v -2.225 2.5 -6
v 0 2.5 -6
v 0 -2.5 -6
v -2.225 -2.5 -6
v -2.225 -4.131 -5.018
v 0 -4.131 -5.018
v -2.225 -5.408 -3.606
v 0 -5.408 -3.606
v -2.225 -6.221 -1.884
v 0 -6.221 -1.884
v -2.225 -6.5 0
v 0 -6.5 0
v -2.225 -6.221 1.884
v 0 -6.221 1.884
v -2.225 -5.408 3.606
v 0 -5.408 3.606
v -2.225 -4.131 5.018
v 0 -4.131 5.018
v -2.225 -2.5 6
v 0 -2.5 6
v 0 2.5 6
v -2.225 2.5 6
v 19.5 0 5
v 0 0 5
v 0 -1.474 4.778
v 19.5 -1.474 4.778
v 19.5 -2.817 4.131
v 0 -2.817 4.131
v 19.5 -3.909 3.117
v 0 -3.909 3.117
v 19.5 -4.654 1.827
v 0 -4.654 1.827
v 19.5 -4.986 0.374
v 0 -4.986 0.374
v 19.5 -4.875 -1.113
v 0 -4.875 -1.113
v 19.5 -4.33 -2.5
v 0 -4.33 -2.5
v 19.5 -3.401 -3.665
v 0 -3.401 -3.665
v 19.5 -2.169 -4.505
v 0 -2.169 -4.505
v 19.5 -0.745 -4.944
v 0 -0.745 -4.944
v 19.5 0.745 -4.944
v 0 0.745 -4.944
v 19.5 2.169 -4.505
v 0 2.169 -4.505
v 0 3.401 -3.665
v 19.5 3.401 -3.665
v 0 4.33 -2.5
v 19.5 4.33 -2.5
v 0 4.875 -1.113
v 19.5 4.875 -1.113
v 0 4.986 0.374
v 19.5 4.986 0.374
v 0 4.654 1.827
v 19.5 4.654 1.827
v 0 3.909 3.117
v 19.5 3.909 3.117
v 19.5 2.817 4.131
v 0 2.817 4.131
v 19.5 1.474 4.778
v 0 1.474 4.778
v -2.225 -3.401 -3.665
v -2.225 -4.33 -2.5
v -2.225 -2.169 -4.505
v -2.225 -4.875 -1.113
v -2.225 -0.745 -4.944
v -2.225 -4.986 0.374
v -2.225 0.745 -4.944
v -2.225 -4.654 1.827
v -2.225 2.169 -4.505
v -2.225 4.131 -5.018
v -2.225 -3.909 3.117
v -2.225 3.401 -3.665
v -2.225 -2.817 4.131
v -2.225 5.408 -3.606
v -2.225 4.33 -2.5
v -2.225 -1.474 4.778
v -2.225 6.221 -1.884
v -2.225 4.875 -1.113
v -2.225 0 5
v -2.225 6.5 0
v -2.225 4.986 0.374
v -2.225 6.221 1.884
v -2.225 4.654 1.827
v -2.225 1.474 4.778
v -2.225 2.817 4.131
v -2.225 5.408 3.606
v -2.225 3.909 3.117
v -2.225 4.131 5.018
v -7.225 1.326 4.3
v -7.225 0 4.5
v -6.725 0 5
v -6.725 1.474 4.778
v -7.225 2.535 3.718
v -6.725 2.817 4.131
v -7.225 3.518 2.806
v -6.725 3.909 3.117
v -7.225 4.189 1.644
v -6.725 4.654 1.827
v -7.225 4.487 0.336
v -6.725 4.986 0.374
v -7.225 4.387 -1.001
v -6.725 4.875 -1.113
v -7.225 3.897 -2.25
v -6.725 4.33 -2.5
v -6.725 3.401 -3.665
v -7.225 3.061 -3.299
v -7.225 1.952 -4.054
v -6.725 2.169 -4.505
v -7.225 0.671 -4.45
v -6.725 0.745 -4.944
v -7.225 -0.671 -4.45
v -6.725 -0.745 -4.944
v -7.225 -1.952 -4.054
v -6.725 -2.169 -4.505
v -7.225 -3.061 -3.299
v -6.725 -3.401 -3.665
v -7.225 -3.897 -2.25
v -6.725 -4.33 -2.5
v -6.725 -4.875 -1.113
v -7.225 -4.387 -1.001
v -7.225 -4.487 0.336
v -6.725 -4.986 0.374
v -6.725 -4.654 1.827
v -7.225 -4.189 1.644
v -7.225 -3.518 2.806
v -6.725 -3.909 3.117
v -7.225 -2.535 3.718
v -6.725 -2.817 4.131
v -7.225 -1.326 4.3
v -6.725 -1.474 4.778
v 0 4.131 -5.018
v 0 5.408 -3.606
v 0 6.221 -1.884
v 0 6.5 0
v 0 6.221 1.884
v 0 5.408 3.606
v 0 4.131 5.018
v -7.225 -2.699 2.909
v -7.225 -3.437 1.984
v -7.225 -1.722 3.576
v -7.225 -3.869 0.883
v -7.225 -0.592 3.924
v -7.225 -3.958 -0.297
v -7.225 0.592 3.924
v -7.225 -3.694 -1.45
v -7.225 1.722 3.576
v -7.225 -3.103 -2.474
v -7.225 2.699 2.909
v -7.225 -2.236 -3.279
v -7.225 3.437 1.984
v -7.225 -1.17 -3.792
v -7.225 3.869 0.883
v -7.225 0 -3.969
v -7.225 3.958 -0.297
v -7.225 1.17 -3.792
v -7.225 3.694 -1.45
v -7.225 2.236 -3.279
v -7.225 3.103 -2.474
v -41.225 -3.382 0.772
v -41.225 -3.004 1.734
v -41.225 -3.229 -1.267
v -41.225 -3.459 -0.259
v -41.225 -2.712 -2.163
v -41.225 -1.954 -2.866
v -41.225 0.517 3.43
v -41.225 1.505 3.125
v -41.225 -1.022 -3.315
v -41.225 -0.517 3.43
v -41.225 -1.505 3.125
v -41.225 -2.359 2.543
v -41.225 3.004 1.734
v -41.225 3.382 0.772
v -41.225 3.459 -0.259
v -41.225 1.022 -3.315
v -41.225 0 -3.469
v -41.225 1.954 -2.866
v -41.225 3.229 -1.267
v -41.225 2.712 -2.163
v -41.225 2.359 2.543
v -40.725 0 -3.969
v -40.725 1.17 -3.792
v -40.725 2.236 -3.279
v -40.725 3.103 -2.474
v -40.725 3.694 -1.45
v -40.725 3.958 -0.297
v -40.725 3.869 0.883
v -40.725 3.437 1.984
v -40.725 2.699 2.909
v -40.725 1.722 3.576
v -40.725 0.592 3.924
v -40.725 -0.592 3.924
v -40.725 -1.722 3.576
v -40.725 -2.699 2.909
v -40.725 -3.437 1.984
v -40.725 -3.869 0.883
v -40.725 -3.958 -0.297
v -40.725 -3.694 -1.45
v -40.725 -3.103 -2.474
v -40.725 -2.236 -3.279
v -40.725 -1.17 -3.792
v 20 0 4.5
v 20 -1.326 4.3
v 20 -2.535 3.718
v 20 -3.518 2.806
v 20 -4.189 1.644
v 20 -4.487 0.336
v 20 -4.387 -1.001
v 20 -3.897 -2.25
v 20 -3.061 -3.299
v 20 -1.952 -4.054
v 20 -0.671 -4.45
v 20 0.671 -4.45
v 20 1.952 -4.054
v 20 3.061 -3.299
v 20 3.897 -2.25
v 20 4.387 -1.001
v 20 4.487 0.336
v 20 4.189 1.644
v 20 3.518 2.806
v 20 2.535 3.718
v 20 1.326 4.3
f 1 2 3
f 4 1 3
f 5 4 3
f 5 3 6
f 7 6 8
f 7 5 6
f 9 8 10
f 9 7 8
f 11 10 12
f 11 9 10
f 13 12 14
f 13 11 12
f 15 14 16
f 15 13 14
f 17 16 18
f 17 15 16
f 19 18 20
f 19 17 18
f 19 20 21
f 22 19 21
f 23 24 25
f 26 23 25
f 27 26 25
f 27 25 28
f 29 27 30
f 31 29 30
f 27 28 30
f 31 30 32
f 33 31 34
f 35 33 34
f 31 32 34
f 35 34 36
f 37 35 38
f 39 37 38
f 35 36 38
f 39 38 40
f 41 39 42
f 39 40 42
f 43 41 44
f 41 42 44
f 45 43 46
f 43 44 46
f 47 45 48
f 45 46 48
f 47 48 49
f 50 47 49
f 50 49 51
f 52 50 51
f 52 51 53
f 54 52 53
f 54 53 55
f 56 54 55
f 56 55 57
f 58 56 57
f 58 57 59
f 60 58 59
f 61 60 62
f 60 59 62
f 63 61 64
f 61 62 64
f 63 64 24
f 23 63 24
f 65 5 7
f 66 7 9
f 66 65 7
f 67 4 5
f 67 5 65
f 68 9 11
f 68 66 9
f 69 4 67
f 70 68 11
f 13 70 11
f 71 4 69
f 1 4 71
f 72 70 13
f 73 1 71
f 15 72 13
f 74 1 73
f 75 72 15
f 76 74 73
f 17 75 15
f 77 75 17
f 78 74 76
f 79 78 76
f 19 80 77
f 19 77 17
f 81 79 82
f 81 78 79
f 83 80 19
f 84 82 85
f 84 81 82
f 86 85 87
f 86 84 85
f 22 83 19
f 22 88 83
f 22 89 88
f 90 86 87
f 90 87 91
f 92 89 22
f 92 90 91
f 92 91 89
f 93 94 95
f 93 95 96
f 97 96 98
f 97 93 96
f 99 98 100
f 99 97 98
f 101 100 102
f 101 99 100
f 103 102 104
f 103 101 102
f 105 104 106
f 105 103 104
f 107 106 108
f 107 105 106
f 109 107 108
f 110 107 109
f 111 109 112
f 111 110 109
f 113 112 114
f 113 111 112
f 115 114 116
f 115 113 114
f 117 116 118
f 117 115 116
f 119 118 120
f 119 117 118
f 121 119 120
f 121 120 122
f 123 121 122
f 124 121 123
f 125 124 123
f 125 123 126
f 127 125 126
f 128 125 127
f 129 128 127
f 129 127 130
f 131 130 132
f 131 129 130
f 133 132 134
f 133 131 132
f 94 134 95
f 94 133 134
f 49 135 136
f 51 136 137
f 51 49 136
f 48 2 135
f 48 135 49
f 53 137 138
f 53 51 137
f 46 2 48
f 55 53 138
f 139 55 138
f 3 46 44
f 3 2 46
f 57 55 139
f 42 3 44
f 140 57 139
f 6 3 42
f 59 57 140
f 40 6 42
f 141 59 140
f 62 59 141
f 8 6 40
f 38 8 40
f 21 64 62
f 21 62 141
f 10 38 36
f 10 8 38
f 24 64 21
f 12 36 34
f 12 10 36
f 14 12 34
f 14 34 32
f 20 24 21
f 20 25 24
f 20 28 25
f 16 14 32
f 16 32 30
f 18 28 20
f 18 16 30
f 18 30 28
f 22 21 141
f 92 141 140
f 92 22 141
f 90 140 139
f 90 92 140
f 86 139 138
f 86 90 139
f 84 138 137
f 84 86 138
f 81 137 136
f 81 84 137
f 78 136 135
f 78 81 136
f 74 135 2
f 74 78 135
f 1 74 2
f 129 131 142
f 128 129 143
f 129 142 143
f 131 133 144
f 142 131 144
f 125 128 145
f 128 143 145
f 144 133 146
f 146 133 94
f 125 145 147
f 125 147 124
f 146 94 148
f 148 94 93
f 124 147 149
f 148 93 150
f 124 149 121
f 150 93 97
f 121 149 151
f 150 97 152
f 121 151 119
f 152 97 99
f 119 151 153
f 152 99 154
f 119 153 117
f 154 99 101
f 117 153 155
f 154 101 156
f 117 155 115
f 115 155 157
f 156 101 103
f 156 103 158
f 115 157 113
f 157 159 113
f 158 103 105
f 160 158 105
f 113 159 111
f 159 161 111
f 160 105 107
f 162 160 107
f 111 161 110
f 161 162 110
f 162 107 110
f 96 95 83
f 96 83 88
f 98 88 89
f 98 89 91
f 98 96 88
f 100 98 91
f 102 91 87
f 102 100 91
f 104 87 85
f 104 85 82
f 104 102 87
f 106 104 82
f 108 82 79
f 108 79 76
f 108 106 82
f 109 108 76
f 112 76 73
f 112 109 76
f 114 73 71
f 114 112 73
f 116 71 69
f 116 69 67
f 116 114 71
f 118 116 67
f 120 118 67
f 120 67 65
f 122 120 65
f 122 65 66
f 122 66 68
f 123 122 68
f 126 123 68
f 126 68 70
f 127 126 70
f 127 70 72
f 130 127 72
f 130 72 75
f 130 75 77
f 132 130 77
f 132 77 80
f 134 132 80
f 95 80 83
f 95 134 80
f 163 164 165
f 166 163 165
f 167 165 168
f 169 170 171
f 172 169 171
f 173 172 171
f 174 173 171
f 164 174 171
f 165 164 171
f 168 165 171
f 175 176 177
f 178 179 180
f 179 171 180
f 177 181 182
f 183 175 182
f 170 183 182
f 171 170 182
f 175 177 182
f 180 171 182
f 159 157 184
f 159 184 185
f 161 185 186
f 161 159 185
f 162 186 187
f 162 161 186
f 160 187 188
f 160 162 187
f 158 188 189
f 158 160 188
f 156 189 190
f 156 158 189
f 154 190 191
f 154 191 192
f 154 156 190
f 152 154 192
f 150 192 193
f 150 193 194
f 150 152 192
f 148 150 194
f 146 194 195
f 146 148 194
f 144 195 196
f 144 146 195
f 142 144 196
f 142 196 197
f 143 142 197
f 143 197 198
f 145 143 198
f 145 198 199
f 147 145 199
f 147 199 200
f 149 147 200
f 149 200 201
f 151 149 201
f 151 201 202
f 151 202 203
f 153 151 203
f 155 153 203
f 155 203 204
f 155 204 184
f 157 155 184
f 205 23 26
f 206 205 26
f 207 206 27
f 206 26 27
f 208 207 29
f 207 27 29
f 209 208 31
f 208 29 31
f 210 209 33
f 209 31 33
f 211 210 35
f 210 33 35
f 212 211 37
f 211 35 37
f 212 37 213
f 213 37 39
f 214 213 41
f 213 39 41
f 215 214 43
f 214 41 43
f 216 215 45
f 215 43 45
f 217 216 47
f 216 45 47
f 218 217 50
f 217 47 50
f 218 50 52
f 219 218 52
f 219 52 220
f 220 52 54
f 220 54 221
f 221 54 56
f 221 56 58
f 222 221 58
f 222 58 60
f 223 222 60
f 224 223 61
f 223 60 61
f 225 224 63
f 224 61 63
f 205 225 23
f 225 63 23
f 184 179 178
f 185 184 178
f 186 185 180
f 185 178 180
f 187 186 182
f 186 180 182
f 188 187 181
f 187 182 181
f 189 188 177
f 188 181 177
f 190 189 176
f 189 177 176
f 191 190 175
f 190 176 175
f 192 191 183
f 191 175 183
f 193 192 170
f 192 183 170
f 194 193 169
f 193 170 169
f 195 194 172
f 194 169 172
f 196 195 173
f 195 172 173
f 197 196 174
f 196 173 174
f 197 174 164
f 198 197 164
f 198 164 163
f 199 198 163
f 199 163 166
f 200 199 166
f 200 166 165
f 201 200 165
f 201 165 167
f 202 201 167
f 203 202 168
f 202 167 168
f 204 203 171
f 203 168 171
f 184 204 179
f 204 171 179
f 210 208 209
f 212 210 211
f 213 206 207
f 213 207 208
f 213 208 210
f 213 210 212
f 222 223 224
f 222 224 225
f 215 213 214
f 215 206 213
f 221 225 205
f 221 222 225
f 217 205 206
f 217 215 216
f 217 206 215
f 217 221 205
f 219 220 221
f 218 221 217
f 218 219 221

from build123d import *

# Parameters (mm, degrees)
BOSS_EXTRUDE1_DEPTH      = 20
BOSS_EXTRUDE1_DEPTH_BACK = 41.225
SKETCH1_R                = 7
CUT_EXTRUDE1_START       = -7.225
SKETCH2_R                = 7
SKETCH2_R_2              = 3.96875
CUT_EXTRUDE1_DEPTH       = 36.171941222
SKETCH3_R                = 7
SKETCH3_R_2              = 5
CUT_EXTRUDE2_DEPTH       = 5
SKETCH4_R                = 7
SKETCH4_R_2              = 6.5
CUT_EXTRUDE3_DEPTH       = 41.236799077
CUT_EXTRUDE4_START       = -20
SKETCH5_R                = 6.5
SKETCH5_R_2              = 5
CUT_EXTRUDE4_DEPTH       = 20
CHAMFER1_SIZE            = 0.5
CUT_EXTRUDE5_DEPTH       = 43.237431563


with BuildPart() as part:
    # Sketch1 → Boss-Extrude1 (new, two sides: drawn at the far end of the back side and taken through both)
    with BuildSketch(Plane(origin=(0, 0, 0), x_dir=(0, 0, -1), z_dir=(1, 0, 0)).offset(-BOSS_EXTRUDE1_DEPTH_BACK)):
        Circle(SKETCH1_R)
    extrude(amount=BOSS_EXTRUDE1_DEPTH + BOSS_EXTRUDE1_DEPTH_BACK)

    # Sketch2 → Cut-Extrude1 (cut, through all)
    with BuildSketch(Plane(origin=(0, 0, 0), x_dir=(0, 0, -1), z_dir=(1, 0, 0)).offset(CUT_EXTRUDE1_START)):
        Circle(SKETCH2_R)
        Circle(SKETCH2_R_2, mode=Mode.SUBTRACT)
    extrude(amount=-CUT_EXTRUDE1_DEPTH, mode=Mode.SUBTRACT)

    # Sketch3 → Cut-Extrude2 (cut)
    with BuildSketch(Plane.ZY.offset(7.225)):
        Circle(SKETCH3_R)
        Circle(SKETCH3_R_2, mode=Mode.SUBTRACT)
    extrude(amount=-CUT_EXTRUDE2_DEPTH, mode=Mode.SUBTRACT)

    # Sketch4 → Cut-Extrude3 (cut, through all)
    with BuildSketch(Plane.ZY.offset(2.225)):
        Circle(SKETCH4_R)
        Circle(SKETCH4_R_2, mode=Mode.SUBTRACT)
    extrude(amount=-CUT_EXTRUDE3_DEPTH, mode=Mode.SUBTRACT)

    # Sketch5 → Cut-Extrude4 (cut)
    with BuildSketch(Plane(origin=(20, 0, 0), x_dir=(0, 0, -1), z_dir=(1, 0, 0)).offset(CUT_EXTRUDE4_START)):
        with Locations(Location((0, 0, 0), (0, 0, 180))):
            Circle(SKETCH5_R)
        with Locations(Location((0, 0, 0), (0, 0, 180))):
            Circle(SKETCH5_R_2, mode=Mode.SUBTRACT)
    extrude(amount=CUT_EXTRUDE4_DEPTH, mode=Mode.SUBTRACT)

    # Chamfer1
    chamfer1_edges = [part.edges().sort_by_distance(p)[0] for p in [
        (-7.225, 0, -5),
        (20, 0, -5),
        (-41.225, 0, 3.96875),
    ]]
    chamfer(chamfer1_edges, length=CHAMFER1_SIZE)

    # Sketch6 → Cut-Extrude5 (cut, through all)
    with BuildSketch(Plane(origin=(0, 0, 0), x_dir=(0, 0, -1), z_dir=(1, 0, 0))):
        with BuildLine():
            Line((-6, -2.5), (-6, 2.5))
            ThreePointArc((-6, 2.5), (-6.5, 0), (-6, -2.5))
        make_face()
        with BuildLine():
            Line((6, 2.5), (6, -2.5))
            ThreePointArc((6, -2.5), (6.5, 0), (6, 2.5))
        make_face()
    extrude(amount=-CUT_EXTRUDE5_DEPTH, mode=Mode.SUBTRACT)


solid = part.part
